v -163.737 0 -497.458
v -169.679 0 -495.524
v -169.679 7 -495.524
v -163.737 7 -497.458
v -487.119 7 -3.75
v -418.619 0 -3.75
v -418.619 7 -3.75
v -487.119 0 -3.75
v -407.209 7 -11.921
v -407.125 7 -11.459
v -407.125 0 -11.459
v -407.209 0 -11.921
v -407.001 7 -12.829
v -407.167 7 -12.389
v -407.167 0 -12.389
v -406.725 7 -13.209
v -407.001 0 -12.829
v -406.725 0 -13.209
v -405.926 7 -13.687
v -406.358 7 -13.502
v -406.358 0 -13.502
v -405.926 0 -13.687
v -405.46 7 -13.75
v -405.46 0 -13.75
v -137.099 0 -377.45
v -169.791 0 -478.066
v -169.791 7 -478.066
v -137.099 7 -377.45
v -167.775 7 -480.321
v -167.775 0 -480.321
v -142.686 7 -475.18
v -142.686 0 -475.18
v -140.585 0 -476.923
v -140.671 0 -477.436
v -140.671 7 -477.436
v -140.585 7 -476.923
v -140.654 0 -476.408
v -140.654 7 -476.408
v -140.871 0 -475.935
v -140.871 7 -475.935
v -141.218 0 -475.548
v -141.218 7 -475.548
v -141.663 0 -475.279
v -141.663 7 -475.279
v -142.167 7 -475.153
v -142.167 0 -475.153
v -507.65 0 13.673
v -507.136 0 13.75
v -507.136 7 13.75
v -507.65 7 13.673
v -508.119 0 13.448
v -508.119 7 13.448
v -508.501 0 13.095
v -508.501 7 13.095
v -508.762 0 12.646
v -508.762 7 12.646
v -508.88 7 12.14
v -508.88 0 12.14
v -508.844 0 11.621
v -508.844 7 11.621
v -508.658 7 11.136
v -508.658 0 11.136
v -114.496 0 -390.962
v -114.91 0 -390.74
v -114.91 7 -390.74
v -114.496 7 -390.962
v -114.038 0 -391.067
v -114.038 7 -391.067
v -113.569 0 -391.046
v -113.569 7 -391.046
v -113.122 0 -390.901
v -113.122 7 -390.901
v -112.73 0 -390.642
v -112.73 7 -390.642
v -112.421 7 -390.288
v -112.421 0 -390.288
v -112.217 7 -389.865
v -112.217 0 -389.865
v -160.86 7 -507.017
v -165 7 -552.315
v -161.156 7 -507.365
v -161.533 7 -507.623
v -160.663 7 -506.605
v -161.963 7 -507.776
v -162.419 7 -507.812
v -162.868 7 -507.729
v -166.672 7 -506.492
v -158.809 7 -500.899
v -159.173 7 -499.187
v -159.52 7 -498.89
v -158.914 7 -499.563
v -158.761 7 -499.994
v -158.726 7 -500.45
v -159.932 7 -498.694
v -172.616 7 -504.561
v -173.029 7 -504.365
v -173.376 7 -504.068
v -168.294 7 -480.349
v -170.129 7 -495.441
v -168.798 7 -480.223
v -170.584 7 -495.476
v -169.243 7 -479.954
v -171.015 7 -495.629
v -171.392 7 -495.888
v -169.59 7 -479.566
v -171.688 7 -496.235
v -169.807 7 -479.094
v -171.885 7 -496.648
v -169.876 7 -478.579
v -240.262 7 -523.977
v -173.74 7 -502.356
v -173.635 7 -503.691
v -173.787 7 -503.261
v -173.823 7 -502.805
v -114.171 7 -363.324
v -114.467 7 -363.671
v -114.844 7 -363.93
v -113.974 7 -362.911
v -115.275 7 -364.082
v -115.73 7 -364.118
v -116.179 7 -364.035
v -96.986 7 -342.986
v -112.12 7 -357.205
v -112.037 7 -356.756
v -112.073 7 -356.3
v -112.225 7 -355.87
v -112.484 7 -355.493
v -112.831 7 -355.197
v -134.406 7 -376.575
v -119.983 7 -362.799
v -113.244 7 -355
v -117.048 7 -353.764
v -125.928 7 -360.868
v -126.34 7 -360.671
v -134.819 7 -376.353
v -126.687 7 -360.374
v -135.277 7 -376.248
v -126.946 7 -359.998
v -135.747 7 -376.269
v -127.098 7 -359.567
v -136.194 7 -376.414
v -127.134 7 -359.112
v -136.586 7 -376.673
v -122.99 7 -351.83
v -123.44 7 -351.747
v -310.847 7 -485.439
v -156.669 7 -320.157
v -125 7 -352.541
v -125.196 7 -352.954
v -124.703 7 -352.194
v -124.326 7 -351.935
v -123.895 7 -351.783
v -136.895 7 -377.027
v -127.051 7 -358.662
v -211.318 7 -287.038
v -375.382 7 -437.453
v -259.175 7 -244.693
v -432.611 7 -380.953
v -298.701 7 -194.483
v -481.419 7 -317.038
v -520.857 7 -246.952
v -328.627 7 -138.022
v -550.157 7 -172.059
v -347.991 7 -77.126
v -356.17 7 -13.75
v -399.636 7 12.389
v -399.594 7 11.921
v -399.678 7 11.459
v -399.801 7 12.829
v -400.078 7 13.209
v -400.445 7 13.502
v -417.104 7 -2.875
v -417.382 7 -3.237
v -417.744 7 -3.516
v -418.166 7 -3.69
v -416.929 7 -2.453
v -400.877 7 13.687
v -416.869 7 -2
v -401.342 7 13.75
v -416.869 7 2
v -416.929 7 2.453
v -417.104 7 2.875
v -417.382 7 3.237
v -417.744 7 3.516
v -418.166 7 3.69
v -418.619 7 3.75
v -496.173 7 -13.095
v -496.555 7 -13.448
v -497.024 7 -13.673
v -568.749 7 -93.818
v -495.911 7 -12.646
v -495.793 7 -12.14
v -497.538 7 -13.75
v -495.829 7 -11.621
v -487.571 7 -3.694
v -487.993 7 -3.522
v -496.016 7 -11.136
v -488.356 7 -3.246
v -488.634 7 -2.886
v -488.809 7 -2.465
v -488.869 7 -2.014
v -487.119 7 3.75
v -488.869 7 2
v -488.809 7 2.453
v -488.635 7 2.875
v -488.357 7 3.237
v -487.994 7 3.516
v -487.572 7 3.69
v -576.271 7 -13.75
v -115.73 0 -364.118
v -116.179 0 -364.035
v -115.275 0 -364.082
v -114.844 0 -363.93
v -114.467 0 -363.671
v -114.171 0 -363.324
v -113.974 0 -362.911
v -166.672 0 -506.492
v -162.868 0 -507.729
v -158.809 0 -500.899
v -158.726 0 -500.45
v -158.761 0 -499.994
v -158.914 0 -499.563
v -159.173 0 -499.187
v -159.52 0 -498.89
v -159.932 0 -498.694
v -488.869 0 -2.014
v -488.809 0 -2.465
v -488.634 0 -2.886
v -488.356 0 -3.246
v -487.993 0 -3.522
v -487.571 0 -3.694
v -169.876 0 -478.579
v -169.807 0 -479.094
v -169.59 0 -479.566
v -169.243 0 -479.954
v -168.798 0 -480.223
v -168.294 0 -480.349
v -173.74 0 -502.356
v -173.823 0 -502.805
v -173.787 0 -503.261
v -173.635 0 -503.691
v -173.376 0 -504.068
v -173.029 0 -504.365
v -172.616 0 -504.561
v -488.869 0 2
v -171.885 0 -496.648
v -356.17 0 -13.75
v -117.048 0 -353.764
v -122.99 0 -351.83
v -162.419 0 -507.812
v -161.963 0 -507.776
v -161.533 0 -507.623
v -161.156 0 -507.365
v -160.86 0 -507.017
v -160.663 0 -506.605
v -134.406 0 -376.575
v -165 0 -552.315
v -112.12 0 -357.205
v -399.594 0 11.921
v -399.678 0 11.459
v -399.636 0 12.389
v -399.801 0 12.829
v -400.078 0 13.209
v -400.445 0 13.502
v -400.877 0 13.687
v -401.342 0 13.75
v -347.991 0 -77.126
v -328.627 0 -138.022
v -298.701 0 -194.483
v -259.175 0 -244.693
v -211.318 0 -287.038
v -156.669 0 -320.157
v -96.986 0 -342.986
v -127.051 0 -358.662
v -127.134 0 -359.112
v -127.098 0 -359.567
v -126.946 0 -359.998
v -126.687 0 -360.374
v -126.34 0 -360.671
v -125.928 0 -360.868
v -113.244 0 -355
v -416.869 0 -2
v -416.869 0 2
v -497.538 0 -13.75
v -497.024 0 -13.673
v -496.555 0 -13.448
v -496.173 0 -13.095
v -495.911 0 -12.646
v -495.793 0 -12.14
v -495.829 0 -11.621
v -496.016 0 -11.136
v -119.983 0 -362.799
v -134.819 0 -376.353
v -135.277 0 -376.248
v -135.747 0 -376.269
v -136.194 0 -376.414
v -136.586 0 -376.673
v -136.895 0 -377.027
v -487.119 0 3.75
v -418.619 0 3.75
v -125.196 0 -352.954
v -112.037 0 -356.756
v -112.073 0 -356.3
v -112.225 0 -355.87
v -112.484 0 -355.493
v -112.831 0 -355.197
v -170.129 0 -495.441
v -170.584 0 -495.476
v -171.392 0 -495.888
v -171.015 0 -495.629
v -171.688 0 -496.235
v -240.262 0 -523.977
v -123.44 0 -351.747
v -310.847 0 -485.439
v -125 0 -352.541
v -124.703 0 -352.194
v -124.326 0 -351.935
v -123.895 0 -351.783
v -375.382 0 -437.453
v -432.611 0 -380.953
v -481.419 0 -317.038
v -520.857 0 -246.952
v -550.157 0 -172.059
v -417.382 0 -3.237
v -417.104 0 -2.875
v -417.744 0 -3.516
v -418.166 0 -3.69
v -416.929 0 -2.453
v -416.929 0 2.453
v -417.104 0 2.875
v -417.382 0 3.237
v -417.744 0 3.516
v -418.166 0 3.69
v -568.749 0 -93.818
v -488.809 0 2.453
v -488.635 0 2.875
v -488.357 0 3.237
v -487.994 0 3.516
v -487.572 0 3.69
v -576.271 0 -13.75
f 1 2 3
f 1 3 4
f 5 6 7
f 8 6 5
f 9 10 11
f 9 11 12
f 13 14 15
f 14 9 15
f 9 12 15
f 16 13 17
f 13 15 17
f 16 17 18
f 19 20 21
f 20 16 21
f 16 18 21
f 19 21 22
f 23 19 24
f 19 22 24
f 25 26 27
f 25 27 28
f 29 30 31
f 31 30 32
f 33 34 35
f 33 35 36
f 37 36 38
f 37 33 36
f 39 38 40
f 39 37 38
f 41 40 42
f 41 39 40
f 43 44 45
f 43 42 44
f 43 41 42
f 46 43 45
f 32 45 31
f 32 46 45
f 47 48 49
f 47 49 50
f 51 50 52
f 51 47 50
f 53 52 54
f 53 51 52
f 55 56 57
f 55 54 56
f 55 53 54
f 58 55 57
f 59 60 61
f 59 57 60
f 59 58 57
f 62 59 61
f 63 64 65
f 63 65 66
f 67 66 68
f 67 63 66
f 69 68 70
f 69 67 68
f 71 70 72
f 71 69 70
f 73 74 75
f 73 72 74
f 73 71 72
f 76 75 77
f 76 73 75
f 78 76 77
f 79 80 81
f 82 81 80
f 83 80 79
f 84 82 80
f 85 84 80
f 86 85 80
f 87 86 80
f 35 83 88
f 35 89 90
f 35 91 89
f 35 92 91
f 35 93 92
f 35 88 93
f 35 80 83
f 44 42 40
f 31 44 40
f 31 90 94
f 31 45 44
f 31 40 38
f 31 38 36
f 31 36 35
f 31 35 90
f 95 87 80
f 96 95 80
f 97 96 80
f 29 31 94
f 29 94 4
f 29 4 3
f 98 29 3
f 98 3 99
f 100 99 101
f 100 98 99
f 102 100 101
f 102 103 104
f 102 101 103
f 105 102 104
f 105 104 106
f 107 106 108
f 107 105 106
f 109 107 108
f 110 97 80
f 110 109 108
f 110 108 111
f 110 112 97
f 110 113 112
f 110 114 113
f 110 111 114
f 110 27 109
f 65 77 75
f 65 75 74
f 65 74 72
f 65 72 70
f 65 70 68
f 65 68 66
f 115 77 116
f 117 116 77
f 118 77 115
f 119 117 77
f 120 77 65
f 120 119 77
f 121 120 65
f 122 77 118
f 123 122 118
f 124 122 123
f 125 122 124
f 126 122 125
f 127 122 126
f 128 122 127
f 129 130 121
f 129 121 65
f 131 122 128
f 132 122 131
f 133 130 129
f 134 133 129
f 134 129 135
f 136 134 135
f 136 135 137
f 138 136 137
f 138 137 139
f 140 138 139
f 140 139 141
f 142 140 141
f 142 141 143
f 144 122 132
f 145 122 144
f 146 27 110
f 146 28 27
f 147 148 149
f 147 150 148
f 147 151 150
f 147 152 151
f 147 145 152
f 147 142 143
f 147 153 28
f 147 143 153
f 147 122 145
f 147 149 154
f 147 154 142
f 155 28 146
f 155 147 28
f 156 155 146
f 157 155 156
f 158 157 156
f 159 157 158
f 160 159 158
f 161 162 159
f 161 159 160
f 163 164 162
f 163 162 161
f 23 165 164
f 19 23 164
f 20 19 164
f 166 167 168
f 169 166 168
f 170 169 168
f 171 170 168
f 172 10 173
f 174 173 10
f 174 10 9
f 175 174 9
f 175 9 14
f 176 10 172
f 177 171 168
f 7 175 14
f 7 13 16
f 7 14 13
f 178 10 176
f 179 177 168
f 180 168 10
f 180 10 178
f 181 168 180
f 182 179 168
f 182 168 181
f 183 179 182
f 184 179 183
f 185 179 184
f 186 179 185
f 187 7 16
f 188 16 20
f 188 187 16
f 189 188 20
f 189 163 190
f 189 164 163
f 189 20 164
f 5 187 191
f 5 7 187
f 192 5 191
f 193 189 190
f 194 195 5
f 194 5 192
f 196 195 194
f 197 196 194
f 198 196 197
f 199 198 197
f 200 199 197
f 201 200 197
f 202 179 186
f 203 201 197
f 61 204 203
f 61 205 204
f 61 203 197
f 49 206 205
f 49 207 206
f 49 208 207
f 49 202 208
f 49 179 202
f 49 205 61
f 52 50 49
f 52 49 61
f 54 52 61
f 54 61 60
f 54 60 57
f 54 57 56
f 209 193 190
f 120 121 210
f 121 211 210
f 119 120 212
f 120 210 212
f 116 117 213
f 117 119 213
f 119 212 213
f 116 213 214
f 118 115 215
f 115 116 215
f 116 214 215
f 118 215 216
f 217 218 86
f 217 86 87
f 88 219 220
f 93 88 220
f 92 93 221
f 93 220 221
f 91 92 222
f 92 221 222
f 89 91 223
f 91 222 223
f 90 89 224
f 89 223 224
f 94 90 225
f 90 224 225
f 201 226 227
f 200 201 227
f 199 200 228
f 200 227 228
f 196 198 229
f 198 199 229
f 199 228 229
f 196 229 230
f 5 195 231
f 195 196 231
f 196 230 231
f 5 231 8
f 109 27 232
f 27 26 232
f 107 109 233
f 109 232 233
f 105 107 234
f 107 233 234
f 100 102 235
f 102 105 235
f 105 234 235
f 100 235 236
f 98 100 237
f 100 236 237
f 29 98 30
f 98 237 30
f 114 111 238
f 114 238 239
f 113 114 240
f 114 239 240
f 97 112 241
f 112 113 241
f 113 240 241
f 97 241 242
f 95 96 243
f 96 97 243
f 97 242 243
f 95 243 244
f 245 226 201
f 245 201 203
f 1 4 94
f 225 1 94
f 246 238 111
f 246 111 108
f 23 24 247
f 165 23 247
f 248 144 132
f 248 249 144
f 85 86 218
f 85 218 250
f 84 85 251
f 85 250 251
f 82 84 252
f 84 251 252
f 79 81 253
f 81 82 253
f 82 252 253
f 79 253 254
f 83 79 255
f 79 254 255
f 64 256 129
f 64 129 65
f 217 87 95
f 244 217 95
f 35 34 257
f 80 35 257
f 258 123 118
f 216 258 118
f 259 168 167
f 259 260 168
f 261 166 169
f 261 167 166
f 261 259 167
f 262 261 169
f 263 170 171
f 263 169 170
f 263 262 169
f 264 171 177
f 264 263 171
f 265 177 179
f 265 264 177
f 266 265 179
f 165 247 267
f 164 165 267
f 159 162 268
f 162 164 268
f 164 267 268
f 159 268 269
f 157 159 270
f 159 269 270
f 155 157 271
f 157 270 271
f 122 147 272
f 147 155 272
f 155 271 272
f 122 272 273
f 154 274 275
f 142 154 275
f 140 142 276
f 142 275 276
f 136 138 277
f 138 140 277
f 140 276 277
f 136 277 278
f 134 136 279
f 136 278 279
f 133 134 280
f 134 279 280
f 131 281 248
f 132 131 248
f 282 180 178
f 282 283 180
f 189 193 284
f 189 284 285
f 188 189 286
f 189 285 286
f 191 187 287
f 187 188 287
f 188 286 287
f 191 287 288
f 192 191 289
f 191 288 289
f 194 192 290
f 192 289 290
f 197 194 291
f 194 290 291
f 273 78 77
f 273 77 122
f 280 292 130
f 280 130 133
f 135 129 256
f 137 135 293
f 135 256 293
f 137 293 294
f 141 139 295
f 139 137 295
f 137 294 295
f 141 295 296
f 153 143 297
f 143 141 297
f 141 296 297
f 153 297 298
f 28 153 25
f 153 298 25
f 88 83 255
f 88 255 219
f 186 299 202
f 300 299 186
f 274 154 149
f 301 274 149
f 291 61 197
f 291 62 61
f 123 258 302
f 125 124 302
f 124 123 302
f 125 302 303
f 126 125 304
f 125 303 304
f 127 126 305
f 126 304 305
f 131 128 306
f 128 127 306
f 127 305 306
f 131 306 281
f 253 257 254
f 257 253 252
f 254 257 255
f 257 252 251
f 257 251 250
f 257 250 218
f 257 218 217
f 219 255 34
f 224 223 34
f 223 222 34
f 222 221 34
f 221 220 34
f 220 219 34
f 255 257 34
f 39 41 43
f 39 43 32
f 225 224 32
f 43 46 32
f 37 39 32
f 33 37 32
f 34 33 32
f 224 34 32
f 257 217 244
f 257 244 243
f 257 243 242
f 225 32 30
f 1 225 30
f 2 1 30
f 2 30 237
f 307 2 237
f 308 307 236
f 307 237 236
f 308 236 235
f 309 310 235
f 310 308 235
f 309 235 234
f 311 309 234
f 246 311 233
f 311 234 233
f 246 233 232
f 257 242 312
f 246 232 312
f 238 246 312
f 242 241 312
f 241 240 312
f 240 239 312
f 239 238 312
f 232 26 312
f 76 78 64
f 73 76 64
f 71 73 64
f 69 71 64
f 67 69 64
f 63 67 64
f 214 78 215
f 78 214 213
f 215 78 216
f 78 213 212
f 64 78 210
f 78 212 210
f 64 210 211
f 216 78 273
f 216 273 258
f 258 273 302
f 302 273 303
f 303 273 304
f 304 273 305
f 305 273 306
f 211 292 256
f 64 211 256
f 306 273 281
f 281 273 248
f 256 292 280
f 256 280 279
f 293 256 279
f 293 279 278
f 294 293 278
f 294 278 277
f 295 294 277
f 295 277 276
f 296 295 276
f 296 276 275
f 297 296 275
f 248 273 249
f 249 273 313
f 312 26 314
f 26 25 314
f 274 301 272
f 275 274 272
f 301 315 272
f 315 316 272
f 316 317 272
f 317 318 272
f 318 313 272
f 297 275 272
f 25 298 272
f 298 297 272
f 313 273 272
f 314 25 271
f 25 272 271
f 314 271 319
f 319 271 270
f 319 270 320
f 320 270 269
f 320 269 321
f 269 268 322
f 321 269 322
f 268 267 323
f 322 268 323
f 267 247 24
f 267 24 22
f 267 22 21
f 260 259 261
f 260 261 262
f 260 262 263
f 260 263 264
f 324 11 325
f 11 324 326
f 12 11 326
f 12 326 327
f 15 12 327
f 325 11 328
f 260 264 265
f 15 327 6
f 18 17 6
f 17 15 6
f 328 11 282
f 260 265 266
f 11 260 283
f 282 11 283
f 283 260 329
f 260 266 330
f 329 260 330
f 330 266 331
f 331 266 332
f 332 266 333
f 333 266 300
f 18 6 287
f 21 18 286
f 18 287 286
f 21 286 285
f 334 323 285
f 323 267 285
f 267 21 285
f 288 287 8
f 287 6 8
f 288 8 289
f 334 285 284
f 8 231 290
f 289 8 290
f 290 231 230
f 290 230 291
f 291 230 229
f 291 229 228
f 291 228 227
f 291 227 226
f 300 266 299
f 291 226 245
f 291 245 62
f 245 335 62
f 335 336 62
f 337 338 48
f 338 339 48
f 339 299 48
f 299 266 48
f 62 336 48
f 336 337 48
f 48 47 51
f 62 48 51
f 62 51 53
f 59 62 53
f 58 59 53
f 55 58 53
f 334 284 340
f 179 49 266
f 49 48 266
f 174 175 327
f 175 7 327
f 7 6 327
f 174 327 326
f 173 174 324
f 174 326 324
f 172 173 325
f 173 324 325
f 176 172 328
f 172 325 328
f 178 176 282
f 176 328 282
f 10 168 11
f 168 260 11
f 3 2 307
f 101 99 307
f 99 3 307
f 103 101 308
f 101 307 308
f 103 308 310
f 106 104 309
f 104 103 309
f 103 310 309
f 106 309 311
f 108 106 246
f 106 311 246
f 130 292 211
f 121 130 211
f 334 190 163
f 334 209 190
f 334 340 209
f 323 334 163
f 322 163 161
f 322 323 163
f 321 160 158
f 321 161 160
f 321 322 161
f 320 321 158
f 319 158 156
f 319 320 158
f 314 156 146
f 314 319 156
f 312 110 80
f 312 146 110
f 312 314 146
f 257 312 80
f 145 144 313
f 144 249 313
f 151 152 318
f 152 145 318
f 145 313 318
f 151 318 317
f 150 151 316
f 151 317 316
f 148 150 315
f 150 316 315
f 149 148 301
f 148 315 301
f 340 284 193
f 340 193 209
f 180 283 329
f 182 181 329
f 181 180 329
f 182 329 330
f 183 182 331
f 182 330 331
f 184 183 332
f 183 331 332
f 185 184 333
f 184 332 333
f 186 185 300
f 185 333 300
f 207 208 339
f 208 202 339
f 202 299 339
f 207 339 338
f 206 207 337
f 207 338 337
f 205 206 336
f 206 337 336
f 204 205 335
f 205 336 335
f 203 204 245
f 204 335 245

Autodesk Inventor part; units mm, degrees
ref_plane "YZ Plane" through (0, 0, 0) normal (1, 0, 0) x (0, 1, 0)
ref_plane "XZ Plane" through (0, 0, 0) normal (0, 1, 0) x (-1, 0, 0)
ref_plane "XY Plane" through (0, 0, 0) normal (0, 0, 1) x (1, 0, 0)
sketch "Sketch1" plane through (0, 0, 0) normal (0, 1, 0) x (-1, 0, 0)
  line L0 (-545.8153, 185.3726) -> (-326.5965, 142.7608)
  line L1 (-545.8153, -185.3726) -> (-326.5965, -142.7608)
  arc A0 (-545.8153, -185.3726) -> (-545.8153, 185.3726) centre (0, 0) ccw
  arc A1 (374.3691, 3.75) -> (372.6191, 2) centre (374.3691, 2) ccw
  arc A2 (372.6191, -2) -> (374.3691, -3.75) centre (374.3691, -2) ccw
  line L2 (380.3691, 3.75) -> (374.3691, 3.75)
  line L3 (374.3691, -3.75) -> (380.3691, -3.75)
  line L4 (382.1191, 2) -> (382.1191, -2)
  arc A3 (380.3691, -3.75) -> (382.1191, -2) centre (380.3691, -2) ccw
  arc A4 (382.1191, 2) -> (380.3691, 3.75) centre (380.3691, 2) ccw
  line L5 (372.6191, -2) -> (372.6191, 2)
  line L6 (523.7076, 2) -> (523.7076, -2)
  arc A5 (523.7076, -2) -> (525.4576, -3.75) centre (525.4576, -2) ccw
  arc A6 (525.4576, 3.75) -> (523.7076, 2) centre (525.4576, 2) ccw
  line L7 (531.4576, -3.75) -> (525.4576, -3.75)
  line L8 (525.4576, 3.75) -> (531.4576, 3.75)
  arc A7 (531.4576, -3.75) -> (533.2076, -2) centre (531.4576, -2) ccw
  line L9 (533.2076, -2) -> (533.2076, 2)
  arc A8 (533.2076, 2) -> (531.4576, 3.75) centre (531.4576, 2) ccw
  arc A9 (-326.5965, -142.7608) -> (-326.5965, 142.7608) centre (0, 0) ccw
  line L10 (116.1792, 364.0349) -> (119.9834, 362.7989)
  arc A10 (121.107, 360.5937) -> (119.9834, 362.7989) centre (119.4426, 361.1345) ccw
  arc A11 (116.1792, 364.0349) -> (113.9741, 362.9114) centre (115.6384, 362.3706) ccw
  line L11 (119.2529, 354.8874) -> (121.107, 360.5937)
  line L12 (113.9741, 362.9114) -> (112.12, 357.205)
  line L13 (117.0478, 353.7638) -> (113.2435, 354.9999)
  arc A12 (112.12, 357.205) -> (113.2435, 354.9999) centre (113.7843, 356.6642) ccw
  arc A13 (117.0478, 353.7638) -> (119.2529, 354.8874) centre (117.5885, 355.4282) ccw
  arc A14 (163.7367, 497.4575) -> (165.9418, 498.5811) centre (164.2774, 499.1218) ccw
  arc A15 (158.8089, 500.8987) -> (159.9324, 498.6936) centre (160.4732, 500.3579) ccw
  line L14 (159.9324, 498.6936) -> (163.7367, 497.4575)
  line L15 (158.8089, 500.8987) -> (160.663, 506.605)
  line L16 (167.7959, 504.2874) -> (165.9418, 498.5811)
  arc A16 (162.8681, 507.7286) -> (160.663, 506.605) centre (162.3273, 506.0642) ccw
  line L17 (166.6723, 506.4925) -> (162.8681, 507.7286)
  arc A17 (167.7959, 504.2874) -> (166.6723, 506.4925) centre (166.1315, 504.8282) ccw
  line L18 (-310.3164, 222.986) -> (-307.9653, 226.222)
  arc A18 (-305.5209, 226.6092) -> (-307.9653, 226.222) centre (-306.5495, 225.1934) ccw
  arc A19 (-310.3164, 222.986) -> (-309.9293, 220.5416) centre (-308.9007, 221.9573) ccw
  line L19 (-300.6668, 223.0825) -> (-305.5209, 226.6092)
  line L20 (-309.9293, 220.5416) -> (-305.0752, 217.0148)
  line L21 (-300.2796, 220.6381) -> (-302.6308, 217.402)
  arc A20 (-305.0752, 217.0148) -> (-302.6308, 217.402) centre (-304.0466, 218.4306) ccw
  arc A21 (-300.2796, 220.6381) -> (-300.6668, 223.0825) centre (-301.6954, 221.6667) ccw
  arc A22 (-422.5128, 309.4456) -> (-422.8999, 311.89) centre (-423.9286, 310.4743) ccw
  arc A23 (-427.3083, 305.8224) -> (-424.8639, 306.2096) centre (-426.2797, 307.2382) ccw
  line L22 (-424.8639, 306.2096) -> (-422.5128, 309.4456)
  line L23 (-427.3083, 305.8224) -> (-432.1624, 309.3491)
  line L24 (-427.754, 315.4167) -> (-422.8999, 311.89)
  arc A24 (-432.5496, 311.7935) -> (-432.1624, 309.3491) centre (-431.1338, 310.7649) ccw
  line L25 (-430.1984, 315.0296) -> (-432.5496, 311.7935)
  arc A25 (-427.754, 315.4167) -> (-430.1984, 315.0296) centre (-428.7827, 314.001) ccw
  line L26 (-307.9653, -226.222) -> (-310.3164, -222.986)
  arc A26 (-309.9293, -220.5416) -> (-310.3164, -222.986) centre (-308.9007, -221.9573) ccw
  arc A27 (-307.9653, -226.222) -> (-305.5209, -226.6092) centre (-306.5495, -225.1934) ccw
  line L27 (-305.0752, -217.0148) -> (-309.9293, -220.5416)
  line L28 (-305.5209, -226.6092) -> (-300.6668, -223.0825)
  line L29 (-302.6308, -217.402) -> (-300.2796, -220.6381)
  arc A28 (-300.6668, -223.0825) -> (-300.2796, -220.6381) centre (-301.6954, -221.6667) ccw
  arc A29 (-302.6308, -217.402) -> (-305.0752, -217.0148) centre (-304.0466, -218.4306) ccw
  arc A30 (-424.8639, -306.2096) -> (-427.3083, -305.8224) centre (-426.2797, -307.2382) ccw
  arc A31 (-422.8999, -311.89) -> (-422.5128, -309.4456) centre (-423.9286, -310.4743) ccw
  line L30 (-422.5128, -309.4456) -> (-424.8639, -306.2096)
  line L31 (-422.8999, -311.89) -> (-427.754, -315.4167)
  line L32 (-432.1624, -309.3491) -> (-427.3083, -305.8224)
  arc A32 (-430.1984, -315.0296) -> (-427.754, -315.4167) centre (-428.7827, -314.001) ccw
  line L33 (-432.5496, -311.7935) -> (-430.1984, -315.0296)
  arc A33 (-432.1624, -309.3491) -> (-432.5496, -311.7935) centre (-431.1338, -310.7649) ccw
  line L34 (119.9834, -362.7989) -> (116.1792, -364.0349)
  arc A34 (113.9741, -362.9114) -> (116.1792, -364.0349) centre (115.6384, -362.3706) ccw
  arc A35 (119.9834, -362.7989) -> (121.107, -360.5937) centre (119.4426, -361.1345) ccw
  line L35 (112.12, -357.205) -> (113.9741, -362.9114)
  line L36 (121.107, -360.5937) -> (119.2529, -354.8874)
  line L37 (113.2435, -354.9999) -> (117.0478, -353.7638)
  arc A36 (119.2529, -354.8874) -> (117.0478, -353.7638) centre (117.5885, -355.4282) ccw
  arc A37 (113.2435, -354.9999) -> (112.12, -357.205) centre (113.7843, -356.6642) ccw
  arc A38 (159.9324, -498.6936) -> (158.8089, -500.8987) centre (160.4732, -500.3579) ccw
  arc A39 (165.9418, -498.5811) -> (163.7367, -497.4575) centre (164.2774, -499.1218) ccw
  line L38 (163.7367, -497.4575) -> (159.9324, -498.6936)
  line L39 (165.9418, -498.5811) -> (167.7959, -504.2874)
  line L40 (160.663, -506.605) -> (158.8089, -500.8987)
  arc A40 (166.6723, -506.4925) -> (167.7959, -504.2874) centre (166.1315, -504.8282) ccw
  line L41 (162.8681, -507.7286) -> (166.6723, -506.4925)
  arc A41 (160.663, -506.605) -> (162.8681, -507.7286) centre (162.3273, -506.0642) ccw
  line L42 (225.4462, 74.1184) -> (211.8442, 74.1184)
  line L43 (225.4462, 74.1184) -> (225.4462, 49.1184)
  arc A42 (405.4604, -13.75) -> (407.1248, -11.4592) centre (405.4604, -12) ccw
  arc A43 (496.0158, -11.1361) -> (497.5378, -13.75) centre (497.5378, -12) ccw
  line L44 (508.6578, 11.1361) -> (496.0158, -11.1361)
  arc A44 (508.6578, 11.1361) -> (507.1359, 13.75) centre (507.1359, 12) ccw
  arc A45 (416.8691, -2) -> (418.6191, -3.75) centre (418.6191, -2) ccw
  line L45 (399.6781, 11.4592) -> (407.1248, -11.4592)
  line L46 (416.8691, 2) -> (416.8691, -2)
  arc A46 (401.3425, 13.75) -> (399.6781, 11.4592) centre (401.3425, 12) ccw
  arc A47 (418.6191, 3.75) -> (416.8691, 2) centre (418.6191, 2) ccw
  line L47 (507.1359, 13.75) -> (401.3425, 13.75)
  line L48 (418.6191, -3.75) -> (487.1191, -3.75)
  line L49 (487.1191, 3.75) -> (418.6191, 3.75)
  arc A48 (487.1191, -3.75) -> (488.8691, -2.0136) centre (487.1326, -2.0136) ccw
  line L50 (488.8691, -2.0136) -> (488.8691, 2)
  arc A49 (488.8691, 2) -> (487.1191, 3.75) centre (487.1191, 2) ccw
  line L51 (405.4604, -13.75) -> (356.1697, -13.75)
  line L52 (497.5378, -13.75) -> (576.271, -13.75)
  arc A50 (163.8684, 468.2978) -> (166.8247, 468.9375) centre (165.1603, 469.4783) ccw
  line L53 (146.5928, 487.2036) -> (163.8684, 468.2978)
  arc A51 (146.5928, 487.2036) -> (143.6366, 486.5639) centre (145.3009, 486.0231) ccw
  line L54 (152.9839, 464.32) -> (149.1668, 465.5602)
  arc A52 (154.0946, 462.119) -> (152.9839, 464.32) centre (152.4473, 462.6685) ccw
  arc A53 (149.1668, 465.5602) -> (146.9616, 464.4366) centre (148.626, 463.8959) ccw
  arc A54 (110.9446, 385.9484) -> (112.609, 383.6576) centre (112.609, 385.4076) ccw
  arc A55 (138.3712, 381.3668) -> (136.7068, 383.6576) centre (136.7068, 381.9076) ccw
  line L55 (112.609, 383.6576) -> (136.7068, 383.6576)
  line L56 (126.9175, 397.0841) -> (130.7218, 395.8481)
  arc A56 (125.794, 399.2893) -> (126.9175, 397.0841) centre (127.4583, 398.7485) ccw
  line L57 (143.6366, 486.5639) -> (110.9446, 385.9484)
  line L58 (146.9616, 464.4366) -> (125.794, 399.2893)
  line L59 (132.9269, 396.9716) -> (154.0946, 462.119)
  arc A57 (130.7218, 395.8481) -> (132.9269, 396.9716) centre (131.2625, 397.5124) ccw
  line L60 (138.3712, 381.3668) -> (123.1395, 334.4885)
  line L61 (166.8247, 468.9375) -> (191.1546, 543.8173)
  line L62 (-394.3199, 288.9791) -> (-396.679, 285.732)
  arc A58 (-391.8835, 289.3553) -> (-394.3199, 288.9791) centre (-392.915, 287.9584) ccw
  arc A59 (-396.679, 285.732) -> (-396.2919, 283.2876) centre (-395.2632, 284.7034) ccw
  line L63 (-338.4298, 243.4115) -> (-336.0786, 246.6476)
  arc A60 (-340.8742, 243.0243) -> (-338.4298, 243.4115) centre (-339.8456, 244.4401) ccw
  line L64 (-396.2919, 283.2876) -> (-340.8742, 243.0243)
  line L65 (-336.4658, 249.092) -> (-391.8835, 289.3553)
  arc A61 (-336.0786, 246.6476) -> (-336.4658, 249.092) centre (-337.4944, 247.6762) ccw
  line L66 (-396.687, -285.7211) -> (-394.3279, -288.9681)
  arc A62 (-396.2919, -283.2876) -> (-396.687, -285.7211) centre (-395.2821, -284.7004) ccw
  arc A63 (-394.3279, -288.9681) -> (-391.8835, -289.3553) centre (-392.9121, -287.9395) ccw
  line L67 (-336.0786, -246.6476) -> (-338.4298, -243.4115)
  arc A64 (-336.4658, -249.092) -> (-336.0786, -246.6476) centre (-337.4944, -247.6762) ccw
  line L68 (-391.8835, -289.3553) -> (-336.4658, -249.092)
  line L69 (-340.8742, -243.0243) -> (-396.2919, -283.2876)
  arc A65 (-338.4298, -243.4115) -> (-340.8742, -243.0243) centre (-339.8456, -244.4401) ccw
  arc A66 (142.6862, -475.1804) -> (140.6706, -477.4355) centre (142.3349, -476.8947) ccw
  line L70 (167.775, -480.3211) -> (142.6862, -475.1804)
  arc A67 (167.775, -480.3211) -> (169.7906, -478.0659) centre (168.1263, -478.6067) ccw
  line L71 (149.1539, -465.5644) -> (152.971, -464.3241)
  arc A68 (146.9616, -464.4366) -> (149.1539, -465.5644) centre (148.6173, -463.9129) ccw
  arc A69 (152.971, -464.3241) -> (154.0946, -462.119) centre (152.4302, -462.6598) ccw
  arc A70 (137.0987, -377.4504) -> (134.4057, -376.5754) centre (135.4343, -377.9912) ccw
  arc A71 (112.2171, -389.8648) -> (114.9101, -390.7398) centre (113.8815, -389.324) ccw
  line L72 (134.4057, -376.5754) -> (114.9101, -390.7398)
  line L73 (130.7218, -395.8481) -> (126.9175, -397.0841)
  arc A72 (132.9269, -396.9716) -> (130.7218, -395.8481) centre (131.2625, -397.5124) ccw
  line L74 (169.7906, -478.0659) -> (137.0987, -377.4504)
  line L75 (154.0946, -462.119) -> (132.9269, -396.9716)
  line L76 (125.794, -399.2893) -> (146.9616, -464.4366)
  arc A73 (126.9175, -397.0841) -> (125.794, -399.2893) centre (127.4583, -398.7485) ccw
  line L77 (112.2171, -389.8648) -> (96.9855, -342.9865)
  line L78 (140.6706, -477.4355) -> (165.0005, -552.3153)
  line L79 (-432.5496, 311.7935) -> (-436.2232, 306.7372)
  line L80 (-435.8361, 304.2928) -> (-430.9801, 300.7647)
  line L81 (-428.5353, 301.1524) -> (-424.8639, 306.2096)
  arc A74 (-436.2232, 306.7372) -> (-435.8361, 304.2928) centre (-434.8075, 305.7085) ccw
  arc A75 (-430.9801, 300.7647) -> (-428.5353, 301.1524) centre (-429.9515, 302.1805) ccw
  line L82 (-310.3164, 222.986) -> (-313.9901, 217.9296)
  line L83 (-313.603, 215.4852) -> (-308.7469, 211.9571)
  line L84 (-306.3022, 212.3448) -> (-302.6308, 217.402)
  arc A76 (-313.9901, 217.9296) -> (-313.603, 215.4852) centre (-312.5743, 216.901) ccw
  arc A77 (-308.7469, 211.9571) -> (-306.3022, 212.3448) centre (-307.7183, 213.3729) ccw
  line L85 (-430.1984, -315.0296) -> (-426.5248, -320.086)
  arc A78 (-426.5248, -320.086) -> (-424.0804, -320.4731) centre (-425.109, -319.0573) ccw
  line L86 (-424.0804, -320.4731) -> (-419.2244, -316.945)
  arc A79 (-419.2244, -316.945) -> (-418.8376, -314.5001) centre (-420.253, -315.5292) ccw
  line L87 (-418.8376, -314.5001) -> (-422.5128, -309.4456)
  line L88 (-307.9653, -226.222) -> (-304.2917, -231.2784)
  arc A80 (-304.2917, -231.2784) -> (-301.8472, -231.6655) centre (-302.8759, -230.2498) ccw
  line L89 (-301.8472, -231.6655) -> (-296.9912, -228.1374)
  line L90 (-296.6045, -225.6925) -> (-300.2796, -220.6381)
  arc A81 (-296.9912, -228.1374) -> (-296.6045, -225.6925) centre (-298.0199, -226.7217) ccw
  line L91 (166.6723, -506.4925) -> (172.6164, -504.5612)
  arc A82 (172.6164, -504.5612) -> (173.74, -502.356) centre (172.0756, -502.8968) ccw
  line L92 (173.74, -502.356) -> (171.8852, -496.6475)
  arc A83 (171.8852, -496.6475) -> (169.6794, -495.5241) centre (170.2208, -497.1882) ccw
  line L93 (169.6794, -495.5241) -> (163.7367, -497.4575)
  line L94 (119.9834, -362.7989) -> (125.9275, -360.8675)
  arc A84 (125.9275, -360.8675) -> (127.0511, -358.6624) centre (125.3867, -359.2032) ccw
  line L95 (127.0511, -358.6624) -> (125.1963, -352.9538)
  line L96 (122.9905, -351.8304) -> (117.0478, -353.7638)
  arc A85 (125.1963, -352.9538) -> (122.9905, -351.8304) centre (123.5319, -353.4946) ccw
  line L97 (533.2076, 2) -> (533.2076, 8.25)
  arc A86 (533.2076, 8.25) -> (531.4576, 10) centre (531.4576, 8.25) ccw
  line L98 (531.4576, 10) -> (525.4552, 10)
  arc A87 (525.4552, 10) -> (523.7052, 8.2493) centre (525.4552, 8.25) ccw
  line L99 (523.7052, 8.2493) -> (523.7076, 2)
  line L100 (382.1191, 2) -> (382.1191, 8.25)
  arc A88 (382.1191, 8.25) -> (380.3691, 10) centre (380.3691, 8.25) ccw
  line L101 (380.3691, 10) -> (374.3668, 10)
  line L102 (372.6168, 8.2493) -> (372.6191, 2)
  arc A89 (374.3668, 10) -> (372.6168, 8.2493) centre (374.3668, 8.25) ccw
  line L103 (162.8681, 507.7286) -> (156.924, 509.6599)
  arc A90 (156.924, 509.6599) -> (154.7189, 508.5364) centre (156.3832, 507.9956) ccw
  line L104 (154.7189, 508.5364) -> (152.864, 502.8278)
  arc A91 (152.864, 502.8278) -> (153.9882, 500.6225) centre (154.5284, 502.287) ccw
  line L105 (153.9882, 500.6225) -> (159.9324, 498.6936)
  line L106 (116.1792, 364.0349) -> (110.2351, 365.9663)
  arc A92 (110.2351, 365.9663) -> (108.03, 364.8427) centre (109.6943, 364.3019) ccw
  line L107 (108.03, 364.8427) -> (106.1751, 359.1341)
  line L108 (107.2993, 356.9288) -> (113.2435, 354.9999)
  arc A93 (106.1751, 359.1341) -> (107.2993, 356.9288) centre (107.8395, 358.5934) ccw
  point P0 (494.5322, -13.75)
  point P1 (417.3817, -3.2374)
  point P2 (417.3817, 3.2374)
  point P3 (488.3566, 3.2374)
  point P4 (165.8959, 466.0791)
  point P5 (147.8315, 465.4551)
  point P6 (125.8991, 397.954)
  point P7 (132.057, 395.9532)
  point P8 (-396.9917, 284.4297)
  point P9 (-339.5718, 242.7117)
  point P10 (-335.766, 247.95)
  point P11 (-393.1859, -289.6679)
  point P12 (-335.766, -247.95)
  point P13 (-339.5718, -242.7117)
  point P14 (139.7418, -474.577)
  point P15 (153.9895, -463.4543)
  point P16 (132.057, -395.9532)
  point P17 (125.8991, -397.954)
  point P18 (-302.6308, 217.402)
  point P19 (113.2435, 354.9999)
  point P20 (372.6191, 2)
  point P21 (117.0478, -353.7638)
  dimension "d34" = 1152.87
  dimension "d45" = 7.5
  dimension "d48" = 712.87
  dimension "d60" = 360
  dimension "d62" = 13.602
  dimension "d63" = 25
  dimension "d72" = 7.5
  dimension "d74" = 3.5
  dimension "d75" = 3.5
  dimension "d79" = 0
  dimension "d80" = 8
  dimension "d81" = 1.75
  dimension "d84" = 8
  dimension "d85" = 1.75
  dimension "d88" = 360
extrude "Extrusion1" add sketch "Sketch1" along normal blind 7 contours A0 L78 A66 L70 A67 L74 A70 L72 A71 L77 A9 L51 A42 L45 A46 L47 A44 L44 A43 L52
properties part number "Level 2c - V2"
